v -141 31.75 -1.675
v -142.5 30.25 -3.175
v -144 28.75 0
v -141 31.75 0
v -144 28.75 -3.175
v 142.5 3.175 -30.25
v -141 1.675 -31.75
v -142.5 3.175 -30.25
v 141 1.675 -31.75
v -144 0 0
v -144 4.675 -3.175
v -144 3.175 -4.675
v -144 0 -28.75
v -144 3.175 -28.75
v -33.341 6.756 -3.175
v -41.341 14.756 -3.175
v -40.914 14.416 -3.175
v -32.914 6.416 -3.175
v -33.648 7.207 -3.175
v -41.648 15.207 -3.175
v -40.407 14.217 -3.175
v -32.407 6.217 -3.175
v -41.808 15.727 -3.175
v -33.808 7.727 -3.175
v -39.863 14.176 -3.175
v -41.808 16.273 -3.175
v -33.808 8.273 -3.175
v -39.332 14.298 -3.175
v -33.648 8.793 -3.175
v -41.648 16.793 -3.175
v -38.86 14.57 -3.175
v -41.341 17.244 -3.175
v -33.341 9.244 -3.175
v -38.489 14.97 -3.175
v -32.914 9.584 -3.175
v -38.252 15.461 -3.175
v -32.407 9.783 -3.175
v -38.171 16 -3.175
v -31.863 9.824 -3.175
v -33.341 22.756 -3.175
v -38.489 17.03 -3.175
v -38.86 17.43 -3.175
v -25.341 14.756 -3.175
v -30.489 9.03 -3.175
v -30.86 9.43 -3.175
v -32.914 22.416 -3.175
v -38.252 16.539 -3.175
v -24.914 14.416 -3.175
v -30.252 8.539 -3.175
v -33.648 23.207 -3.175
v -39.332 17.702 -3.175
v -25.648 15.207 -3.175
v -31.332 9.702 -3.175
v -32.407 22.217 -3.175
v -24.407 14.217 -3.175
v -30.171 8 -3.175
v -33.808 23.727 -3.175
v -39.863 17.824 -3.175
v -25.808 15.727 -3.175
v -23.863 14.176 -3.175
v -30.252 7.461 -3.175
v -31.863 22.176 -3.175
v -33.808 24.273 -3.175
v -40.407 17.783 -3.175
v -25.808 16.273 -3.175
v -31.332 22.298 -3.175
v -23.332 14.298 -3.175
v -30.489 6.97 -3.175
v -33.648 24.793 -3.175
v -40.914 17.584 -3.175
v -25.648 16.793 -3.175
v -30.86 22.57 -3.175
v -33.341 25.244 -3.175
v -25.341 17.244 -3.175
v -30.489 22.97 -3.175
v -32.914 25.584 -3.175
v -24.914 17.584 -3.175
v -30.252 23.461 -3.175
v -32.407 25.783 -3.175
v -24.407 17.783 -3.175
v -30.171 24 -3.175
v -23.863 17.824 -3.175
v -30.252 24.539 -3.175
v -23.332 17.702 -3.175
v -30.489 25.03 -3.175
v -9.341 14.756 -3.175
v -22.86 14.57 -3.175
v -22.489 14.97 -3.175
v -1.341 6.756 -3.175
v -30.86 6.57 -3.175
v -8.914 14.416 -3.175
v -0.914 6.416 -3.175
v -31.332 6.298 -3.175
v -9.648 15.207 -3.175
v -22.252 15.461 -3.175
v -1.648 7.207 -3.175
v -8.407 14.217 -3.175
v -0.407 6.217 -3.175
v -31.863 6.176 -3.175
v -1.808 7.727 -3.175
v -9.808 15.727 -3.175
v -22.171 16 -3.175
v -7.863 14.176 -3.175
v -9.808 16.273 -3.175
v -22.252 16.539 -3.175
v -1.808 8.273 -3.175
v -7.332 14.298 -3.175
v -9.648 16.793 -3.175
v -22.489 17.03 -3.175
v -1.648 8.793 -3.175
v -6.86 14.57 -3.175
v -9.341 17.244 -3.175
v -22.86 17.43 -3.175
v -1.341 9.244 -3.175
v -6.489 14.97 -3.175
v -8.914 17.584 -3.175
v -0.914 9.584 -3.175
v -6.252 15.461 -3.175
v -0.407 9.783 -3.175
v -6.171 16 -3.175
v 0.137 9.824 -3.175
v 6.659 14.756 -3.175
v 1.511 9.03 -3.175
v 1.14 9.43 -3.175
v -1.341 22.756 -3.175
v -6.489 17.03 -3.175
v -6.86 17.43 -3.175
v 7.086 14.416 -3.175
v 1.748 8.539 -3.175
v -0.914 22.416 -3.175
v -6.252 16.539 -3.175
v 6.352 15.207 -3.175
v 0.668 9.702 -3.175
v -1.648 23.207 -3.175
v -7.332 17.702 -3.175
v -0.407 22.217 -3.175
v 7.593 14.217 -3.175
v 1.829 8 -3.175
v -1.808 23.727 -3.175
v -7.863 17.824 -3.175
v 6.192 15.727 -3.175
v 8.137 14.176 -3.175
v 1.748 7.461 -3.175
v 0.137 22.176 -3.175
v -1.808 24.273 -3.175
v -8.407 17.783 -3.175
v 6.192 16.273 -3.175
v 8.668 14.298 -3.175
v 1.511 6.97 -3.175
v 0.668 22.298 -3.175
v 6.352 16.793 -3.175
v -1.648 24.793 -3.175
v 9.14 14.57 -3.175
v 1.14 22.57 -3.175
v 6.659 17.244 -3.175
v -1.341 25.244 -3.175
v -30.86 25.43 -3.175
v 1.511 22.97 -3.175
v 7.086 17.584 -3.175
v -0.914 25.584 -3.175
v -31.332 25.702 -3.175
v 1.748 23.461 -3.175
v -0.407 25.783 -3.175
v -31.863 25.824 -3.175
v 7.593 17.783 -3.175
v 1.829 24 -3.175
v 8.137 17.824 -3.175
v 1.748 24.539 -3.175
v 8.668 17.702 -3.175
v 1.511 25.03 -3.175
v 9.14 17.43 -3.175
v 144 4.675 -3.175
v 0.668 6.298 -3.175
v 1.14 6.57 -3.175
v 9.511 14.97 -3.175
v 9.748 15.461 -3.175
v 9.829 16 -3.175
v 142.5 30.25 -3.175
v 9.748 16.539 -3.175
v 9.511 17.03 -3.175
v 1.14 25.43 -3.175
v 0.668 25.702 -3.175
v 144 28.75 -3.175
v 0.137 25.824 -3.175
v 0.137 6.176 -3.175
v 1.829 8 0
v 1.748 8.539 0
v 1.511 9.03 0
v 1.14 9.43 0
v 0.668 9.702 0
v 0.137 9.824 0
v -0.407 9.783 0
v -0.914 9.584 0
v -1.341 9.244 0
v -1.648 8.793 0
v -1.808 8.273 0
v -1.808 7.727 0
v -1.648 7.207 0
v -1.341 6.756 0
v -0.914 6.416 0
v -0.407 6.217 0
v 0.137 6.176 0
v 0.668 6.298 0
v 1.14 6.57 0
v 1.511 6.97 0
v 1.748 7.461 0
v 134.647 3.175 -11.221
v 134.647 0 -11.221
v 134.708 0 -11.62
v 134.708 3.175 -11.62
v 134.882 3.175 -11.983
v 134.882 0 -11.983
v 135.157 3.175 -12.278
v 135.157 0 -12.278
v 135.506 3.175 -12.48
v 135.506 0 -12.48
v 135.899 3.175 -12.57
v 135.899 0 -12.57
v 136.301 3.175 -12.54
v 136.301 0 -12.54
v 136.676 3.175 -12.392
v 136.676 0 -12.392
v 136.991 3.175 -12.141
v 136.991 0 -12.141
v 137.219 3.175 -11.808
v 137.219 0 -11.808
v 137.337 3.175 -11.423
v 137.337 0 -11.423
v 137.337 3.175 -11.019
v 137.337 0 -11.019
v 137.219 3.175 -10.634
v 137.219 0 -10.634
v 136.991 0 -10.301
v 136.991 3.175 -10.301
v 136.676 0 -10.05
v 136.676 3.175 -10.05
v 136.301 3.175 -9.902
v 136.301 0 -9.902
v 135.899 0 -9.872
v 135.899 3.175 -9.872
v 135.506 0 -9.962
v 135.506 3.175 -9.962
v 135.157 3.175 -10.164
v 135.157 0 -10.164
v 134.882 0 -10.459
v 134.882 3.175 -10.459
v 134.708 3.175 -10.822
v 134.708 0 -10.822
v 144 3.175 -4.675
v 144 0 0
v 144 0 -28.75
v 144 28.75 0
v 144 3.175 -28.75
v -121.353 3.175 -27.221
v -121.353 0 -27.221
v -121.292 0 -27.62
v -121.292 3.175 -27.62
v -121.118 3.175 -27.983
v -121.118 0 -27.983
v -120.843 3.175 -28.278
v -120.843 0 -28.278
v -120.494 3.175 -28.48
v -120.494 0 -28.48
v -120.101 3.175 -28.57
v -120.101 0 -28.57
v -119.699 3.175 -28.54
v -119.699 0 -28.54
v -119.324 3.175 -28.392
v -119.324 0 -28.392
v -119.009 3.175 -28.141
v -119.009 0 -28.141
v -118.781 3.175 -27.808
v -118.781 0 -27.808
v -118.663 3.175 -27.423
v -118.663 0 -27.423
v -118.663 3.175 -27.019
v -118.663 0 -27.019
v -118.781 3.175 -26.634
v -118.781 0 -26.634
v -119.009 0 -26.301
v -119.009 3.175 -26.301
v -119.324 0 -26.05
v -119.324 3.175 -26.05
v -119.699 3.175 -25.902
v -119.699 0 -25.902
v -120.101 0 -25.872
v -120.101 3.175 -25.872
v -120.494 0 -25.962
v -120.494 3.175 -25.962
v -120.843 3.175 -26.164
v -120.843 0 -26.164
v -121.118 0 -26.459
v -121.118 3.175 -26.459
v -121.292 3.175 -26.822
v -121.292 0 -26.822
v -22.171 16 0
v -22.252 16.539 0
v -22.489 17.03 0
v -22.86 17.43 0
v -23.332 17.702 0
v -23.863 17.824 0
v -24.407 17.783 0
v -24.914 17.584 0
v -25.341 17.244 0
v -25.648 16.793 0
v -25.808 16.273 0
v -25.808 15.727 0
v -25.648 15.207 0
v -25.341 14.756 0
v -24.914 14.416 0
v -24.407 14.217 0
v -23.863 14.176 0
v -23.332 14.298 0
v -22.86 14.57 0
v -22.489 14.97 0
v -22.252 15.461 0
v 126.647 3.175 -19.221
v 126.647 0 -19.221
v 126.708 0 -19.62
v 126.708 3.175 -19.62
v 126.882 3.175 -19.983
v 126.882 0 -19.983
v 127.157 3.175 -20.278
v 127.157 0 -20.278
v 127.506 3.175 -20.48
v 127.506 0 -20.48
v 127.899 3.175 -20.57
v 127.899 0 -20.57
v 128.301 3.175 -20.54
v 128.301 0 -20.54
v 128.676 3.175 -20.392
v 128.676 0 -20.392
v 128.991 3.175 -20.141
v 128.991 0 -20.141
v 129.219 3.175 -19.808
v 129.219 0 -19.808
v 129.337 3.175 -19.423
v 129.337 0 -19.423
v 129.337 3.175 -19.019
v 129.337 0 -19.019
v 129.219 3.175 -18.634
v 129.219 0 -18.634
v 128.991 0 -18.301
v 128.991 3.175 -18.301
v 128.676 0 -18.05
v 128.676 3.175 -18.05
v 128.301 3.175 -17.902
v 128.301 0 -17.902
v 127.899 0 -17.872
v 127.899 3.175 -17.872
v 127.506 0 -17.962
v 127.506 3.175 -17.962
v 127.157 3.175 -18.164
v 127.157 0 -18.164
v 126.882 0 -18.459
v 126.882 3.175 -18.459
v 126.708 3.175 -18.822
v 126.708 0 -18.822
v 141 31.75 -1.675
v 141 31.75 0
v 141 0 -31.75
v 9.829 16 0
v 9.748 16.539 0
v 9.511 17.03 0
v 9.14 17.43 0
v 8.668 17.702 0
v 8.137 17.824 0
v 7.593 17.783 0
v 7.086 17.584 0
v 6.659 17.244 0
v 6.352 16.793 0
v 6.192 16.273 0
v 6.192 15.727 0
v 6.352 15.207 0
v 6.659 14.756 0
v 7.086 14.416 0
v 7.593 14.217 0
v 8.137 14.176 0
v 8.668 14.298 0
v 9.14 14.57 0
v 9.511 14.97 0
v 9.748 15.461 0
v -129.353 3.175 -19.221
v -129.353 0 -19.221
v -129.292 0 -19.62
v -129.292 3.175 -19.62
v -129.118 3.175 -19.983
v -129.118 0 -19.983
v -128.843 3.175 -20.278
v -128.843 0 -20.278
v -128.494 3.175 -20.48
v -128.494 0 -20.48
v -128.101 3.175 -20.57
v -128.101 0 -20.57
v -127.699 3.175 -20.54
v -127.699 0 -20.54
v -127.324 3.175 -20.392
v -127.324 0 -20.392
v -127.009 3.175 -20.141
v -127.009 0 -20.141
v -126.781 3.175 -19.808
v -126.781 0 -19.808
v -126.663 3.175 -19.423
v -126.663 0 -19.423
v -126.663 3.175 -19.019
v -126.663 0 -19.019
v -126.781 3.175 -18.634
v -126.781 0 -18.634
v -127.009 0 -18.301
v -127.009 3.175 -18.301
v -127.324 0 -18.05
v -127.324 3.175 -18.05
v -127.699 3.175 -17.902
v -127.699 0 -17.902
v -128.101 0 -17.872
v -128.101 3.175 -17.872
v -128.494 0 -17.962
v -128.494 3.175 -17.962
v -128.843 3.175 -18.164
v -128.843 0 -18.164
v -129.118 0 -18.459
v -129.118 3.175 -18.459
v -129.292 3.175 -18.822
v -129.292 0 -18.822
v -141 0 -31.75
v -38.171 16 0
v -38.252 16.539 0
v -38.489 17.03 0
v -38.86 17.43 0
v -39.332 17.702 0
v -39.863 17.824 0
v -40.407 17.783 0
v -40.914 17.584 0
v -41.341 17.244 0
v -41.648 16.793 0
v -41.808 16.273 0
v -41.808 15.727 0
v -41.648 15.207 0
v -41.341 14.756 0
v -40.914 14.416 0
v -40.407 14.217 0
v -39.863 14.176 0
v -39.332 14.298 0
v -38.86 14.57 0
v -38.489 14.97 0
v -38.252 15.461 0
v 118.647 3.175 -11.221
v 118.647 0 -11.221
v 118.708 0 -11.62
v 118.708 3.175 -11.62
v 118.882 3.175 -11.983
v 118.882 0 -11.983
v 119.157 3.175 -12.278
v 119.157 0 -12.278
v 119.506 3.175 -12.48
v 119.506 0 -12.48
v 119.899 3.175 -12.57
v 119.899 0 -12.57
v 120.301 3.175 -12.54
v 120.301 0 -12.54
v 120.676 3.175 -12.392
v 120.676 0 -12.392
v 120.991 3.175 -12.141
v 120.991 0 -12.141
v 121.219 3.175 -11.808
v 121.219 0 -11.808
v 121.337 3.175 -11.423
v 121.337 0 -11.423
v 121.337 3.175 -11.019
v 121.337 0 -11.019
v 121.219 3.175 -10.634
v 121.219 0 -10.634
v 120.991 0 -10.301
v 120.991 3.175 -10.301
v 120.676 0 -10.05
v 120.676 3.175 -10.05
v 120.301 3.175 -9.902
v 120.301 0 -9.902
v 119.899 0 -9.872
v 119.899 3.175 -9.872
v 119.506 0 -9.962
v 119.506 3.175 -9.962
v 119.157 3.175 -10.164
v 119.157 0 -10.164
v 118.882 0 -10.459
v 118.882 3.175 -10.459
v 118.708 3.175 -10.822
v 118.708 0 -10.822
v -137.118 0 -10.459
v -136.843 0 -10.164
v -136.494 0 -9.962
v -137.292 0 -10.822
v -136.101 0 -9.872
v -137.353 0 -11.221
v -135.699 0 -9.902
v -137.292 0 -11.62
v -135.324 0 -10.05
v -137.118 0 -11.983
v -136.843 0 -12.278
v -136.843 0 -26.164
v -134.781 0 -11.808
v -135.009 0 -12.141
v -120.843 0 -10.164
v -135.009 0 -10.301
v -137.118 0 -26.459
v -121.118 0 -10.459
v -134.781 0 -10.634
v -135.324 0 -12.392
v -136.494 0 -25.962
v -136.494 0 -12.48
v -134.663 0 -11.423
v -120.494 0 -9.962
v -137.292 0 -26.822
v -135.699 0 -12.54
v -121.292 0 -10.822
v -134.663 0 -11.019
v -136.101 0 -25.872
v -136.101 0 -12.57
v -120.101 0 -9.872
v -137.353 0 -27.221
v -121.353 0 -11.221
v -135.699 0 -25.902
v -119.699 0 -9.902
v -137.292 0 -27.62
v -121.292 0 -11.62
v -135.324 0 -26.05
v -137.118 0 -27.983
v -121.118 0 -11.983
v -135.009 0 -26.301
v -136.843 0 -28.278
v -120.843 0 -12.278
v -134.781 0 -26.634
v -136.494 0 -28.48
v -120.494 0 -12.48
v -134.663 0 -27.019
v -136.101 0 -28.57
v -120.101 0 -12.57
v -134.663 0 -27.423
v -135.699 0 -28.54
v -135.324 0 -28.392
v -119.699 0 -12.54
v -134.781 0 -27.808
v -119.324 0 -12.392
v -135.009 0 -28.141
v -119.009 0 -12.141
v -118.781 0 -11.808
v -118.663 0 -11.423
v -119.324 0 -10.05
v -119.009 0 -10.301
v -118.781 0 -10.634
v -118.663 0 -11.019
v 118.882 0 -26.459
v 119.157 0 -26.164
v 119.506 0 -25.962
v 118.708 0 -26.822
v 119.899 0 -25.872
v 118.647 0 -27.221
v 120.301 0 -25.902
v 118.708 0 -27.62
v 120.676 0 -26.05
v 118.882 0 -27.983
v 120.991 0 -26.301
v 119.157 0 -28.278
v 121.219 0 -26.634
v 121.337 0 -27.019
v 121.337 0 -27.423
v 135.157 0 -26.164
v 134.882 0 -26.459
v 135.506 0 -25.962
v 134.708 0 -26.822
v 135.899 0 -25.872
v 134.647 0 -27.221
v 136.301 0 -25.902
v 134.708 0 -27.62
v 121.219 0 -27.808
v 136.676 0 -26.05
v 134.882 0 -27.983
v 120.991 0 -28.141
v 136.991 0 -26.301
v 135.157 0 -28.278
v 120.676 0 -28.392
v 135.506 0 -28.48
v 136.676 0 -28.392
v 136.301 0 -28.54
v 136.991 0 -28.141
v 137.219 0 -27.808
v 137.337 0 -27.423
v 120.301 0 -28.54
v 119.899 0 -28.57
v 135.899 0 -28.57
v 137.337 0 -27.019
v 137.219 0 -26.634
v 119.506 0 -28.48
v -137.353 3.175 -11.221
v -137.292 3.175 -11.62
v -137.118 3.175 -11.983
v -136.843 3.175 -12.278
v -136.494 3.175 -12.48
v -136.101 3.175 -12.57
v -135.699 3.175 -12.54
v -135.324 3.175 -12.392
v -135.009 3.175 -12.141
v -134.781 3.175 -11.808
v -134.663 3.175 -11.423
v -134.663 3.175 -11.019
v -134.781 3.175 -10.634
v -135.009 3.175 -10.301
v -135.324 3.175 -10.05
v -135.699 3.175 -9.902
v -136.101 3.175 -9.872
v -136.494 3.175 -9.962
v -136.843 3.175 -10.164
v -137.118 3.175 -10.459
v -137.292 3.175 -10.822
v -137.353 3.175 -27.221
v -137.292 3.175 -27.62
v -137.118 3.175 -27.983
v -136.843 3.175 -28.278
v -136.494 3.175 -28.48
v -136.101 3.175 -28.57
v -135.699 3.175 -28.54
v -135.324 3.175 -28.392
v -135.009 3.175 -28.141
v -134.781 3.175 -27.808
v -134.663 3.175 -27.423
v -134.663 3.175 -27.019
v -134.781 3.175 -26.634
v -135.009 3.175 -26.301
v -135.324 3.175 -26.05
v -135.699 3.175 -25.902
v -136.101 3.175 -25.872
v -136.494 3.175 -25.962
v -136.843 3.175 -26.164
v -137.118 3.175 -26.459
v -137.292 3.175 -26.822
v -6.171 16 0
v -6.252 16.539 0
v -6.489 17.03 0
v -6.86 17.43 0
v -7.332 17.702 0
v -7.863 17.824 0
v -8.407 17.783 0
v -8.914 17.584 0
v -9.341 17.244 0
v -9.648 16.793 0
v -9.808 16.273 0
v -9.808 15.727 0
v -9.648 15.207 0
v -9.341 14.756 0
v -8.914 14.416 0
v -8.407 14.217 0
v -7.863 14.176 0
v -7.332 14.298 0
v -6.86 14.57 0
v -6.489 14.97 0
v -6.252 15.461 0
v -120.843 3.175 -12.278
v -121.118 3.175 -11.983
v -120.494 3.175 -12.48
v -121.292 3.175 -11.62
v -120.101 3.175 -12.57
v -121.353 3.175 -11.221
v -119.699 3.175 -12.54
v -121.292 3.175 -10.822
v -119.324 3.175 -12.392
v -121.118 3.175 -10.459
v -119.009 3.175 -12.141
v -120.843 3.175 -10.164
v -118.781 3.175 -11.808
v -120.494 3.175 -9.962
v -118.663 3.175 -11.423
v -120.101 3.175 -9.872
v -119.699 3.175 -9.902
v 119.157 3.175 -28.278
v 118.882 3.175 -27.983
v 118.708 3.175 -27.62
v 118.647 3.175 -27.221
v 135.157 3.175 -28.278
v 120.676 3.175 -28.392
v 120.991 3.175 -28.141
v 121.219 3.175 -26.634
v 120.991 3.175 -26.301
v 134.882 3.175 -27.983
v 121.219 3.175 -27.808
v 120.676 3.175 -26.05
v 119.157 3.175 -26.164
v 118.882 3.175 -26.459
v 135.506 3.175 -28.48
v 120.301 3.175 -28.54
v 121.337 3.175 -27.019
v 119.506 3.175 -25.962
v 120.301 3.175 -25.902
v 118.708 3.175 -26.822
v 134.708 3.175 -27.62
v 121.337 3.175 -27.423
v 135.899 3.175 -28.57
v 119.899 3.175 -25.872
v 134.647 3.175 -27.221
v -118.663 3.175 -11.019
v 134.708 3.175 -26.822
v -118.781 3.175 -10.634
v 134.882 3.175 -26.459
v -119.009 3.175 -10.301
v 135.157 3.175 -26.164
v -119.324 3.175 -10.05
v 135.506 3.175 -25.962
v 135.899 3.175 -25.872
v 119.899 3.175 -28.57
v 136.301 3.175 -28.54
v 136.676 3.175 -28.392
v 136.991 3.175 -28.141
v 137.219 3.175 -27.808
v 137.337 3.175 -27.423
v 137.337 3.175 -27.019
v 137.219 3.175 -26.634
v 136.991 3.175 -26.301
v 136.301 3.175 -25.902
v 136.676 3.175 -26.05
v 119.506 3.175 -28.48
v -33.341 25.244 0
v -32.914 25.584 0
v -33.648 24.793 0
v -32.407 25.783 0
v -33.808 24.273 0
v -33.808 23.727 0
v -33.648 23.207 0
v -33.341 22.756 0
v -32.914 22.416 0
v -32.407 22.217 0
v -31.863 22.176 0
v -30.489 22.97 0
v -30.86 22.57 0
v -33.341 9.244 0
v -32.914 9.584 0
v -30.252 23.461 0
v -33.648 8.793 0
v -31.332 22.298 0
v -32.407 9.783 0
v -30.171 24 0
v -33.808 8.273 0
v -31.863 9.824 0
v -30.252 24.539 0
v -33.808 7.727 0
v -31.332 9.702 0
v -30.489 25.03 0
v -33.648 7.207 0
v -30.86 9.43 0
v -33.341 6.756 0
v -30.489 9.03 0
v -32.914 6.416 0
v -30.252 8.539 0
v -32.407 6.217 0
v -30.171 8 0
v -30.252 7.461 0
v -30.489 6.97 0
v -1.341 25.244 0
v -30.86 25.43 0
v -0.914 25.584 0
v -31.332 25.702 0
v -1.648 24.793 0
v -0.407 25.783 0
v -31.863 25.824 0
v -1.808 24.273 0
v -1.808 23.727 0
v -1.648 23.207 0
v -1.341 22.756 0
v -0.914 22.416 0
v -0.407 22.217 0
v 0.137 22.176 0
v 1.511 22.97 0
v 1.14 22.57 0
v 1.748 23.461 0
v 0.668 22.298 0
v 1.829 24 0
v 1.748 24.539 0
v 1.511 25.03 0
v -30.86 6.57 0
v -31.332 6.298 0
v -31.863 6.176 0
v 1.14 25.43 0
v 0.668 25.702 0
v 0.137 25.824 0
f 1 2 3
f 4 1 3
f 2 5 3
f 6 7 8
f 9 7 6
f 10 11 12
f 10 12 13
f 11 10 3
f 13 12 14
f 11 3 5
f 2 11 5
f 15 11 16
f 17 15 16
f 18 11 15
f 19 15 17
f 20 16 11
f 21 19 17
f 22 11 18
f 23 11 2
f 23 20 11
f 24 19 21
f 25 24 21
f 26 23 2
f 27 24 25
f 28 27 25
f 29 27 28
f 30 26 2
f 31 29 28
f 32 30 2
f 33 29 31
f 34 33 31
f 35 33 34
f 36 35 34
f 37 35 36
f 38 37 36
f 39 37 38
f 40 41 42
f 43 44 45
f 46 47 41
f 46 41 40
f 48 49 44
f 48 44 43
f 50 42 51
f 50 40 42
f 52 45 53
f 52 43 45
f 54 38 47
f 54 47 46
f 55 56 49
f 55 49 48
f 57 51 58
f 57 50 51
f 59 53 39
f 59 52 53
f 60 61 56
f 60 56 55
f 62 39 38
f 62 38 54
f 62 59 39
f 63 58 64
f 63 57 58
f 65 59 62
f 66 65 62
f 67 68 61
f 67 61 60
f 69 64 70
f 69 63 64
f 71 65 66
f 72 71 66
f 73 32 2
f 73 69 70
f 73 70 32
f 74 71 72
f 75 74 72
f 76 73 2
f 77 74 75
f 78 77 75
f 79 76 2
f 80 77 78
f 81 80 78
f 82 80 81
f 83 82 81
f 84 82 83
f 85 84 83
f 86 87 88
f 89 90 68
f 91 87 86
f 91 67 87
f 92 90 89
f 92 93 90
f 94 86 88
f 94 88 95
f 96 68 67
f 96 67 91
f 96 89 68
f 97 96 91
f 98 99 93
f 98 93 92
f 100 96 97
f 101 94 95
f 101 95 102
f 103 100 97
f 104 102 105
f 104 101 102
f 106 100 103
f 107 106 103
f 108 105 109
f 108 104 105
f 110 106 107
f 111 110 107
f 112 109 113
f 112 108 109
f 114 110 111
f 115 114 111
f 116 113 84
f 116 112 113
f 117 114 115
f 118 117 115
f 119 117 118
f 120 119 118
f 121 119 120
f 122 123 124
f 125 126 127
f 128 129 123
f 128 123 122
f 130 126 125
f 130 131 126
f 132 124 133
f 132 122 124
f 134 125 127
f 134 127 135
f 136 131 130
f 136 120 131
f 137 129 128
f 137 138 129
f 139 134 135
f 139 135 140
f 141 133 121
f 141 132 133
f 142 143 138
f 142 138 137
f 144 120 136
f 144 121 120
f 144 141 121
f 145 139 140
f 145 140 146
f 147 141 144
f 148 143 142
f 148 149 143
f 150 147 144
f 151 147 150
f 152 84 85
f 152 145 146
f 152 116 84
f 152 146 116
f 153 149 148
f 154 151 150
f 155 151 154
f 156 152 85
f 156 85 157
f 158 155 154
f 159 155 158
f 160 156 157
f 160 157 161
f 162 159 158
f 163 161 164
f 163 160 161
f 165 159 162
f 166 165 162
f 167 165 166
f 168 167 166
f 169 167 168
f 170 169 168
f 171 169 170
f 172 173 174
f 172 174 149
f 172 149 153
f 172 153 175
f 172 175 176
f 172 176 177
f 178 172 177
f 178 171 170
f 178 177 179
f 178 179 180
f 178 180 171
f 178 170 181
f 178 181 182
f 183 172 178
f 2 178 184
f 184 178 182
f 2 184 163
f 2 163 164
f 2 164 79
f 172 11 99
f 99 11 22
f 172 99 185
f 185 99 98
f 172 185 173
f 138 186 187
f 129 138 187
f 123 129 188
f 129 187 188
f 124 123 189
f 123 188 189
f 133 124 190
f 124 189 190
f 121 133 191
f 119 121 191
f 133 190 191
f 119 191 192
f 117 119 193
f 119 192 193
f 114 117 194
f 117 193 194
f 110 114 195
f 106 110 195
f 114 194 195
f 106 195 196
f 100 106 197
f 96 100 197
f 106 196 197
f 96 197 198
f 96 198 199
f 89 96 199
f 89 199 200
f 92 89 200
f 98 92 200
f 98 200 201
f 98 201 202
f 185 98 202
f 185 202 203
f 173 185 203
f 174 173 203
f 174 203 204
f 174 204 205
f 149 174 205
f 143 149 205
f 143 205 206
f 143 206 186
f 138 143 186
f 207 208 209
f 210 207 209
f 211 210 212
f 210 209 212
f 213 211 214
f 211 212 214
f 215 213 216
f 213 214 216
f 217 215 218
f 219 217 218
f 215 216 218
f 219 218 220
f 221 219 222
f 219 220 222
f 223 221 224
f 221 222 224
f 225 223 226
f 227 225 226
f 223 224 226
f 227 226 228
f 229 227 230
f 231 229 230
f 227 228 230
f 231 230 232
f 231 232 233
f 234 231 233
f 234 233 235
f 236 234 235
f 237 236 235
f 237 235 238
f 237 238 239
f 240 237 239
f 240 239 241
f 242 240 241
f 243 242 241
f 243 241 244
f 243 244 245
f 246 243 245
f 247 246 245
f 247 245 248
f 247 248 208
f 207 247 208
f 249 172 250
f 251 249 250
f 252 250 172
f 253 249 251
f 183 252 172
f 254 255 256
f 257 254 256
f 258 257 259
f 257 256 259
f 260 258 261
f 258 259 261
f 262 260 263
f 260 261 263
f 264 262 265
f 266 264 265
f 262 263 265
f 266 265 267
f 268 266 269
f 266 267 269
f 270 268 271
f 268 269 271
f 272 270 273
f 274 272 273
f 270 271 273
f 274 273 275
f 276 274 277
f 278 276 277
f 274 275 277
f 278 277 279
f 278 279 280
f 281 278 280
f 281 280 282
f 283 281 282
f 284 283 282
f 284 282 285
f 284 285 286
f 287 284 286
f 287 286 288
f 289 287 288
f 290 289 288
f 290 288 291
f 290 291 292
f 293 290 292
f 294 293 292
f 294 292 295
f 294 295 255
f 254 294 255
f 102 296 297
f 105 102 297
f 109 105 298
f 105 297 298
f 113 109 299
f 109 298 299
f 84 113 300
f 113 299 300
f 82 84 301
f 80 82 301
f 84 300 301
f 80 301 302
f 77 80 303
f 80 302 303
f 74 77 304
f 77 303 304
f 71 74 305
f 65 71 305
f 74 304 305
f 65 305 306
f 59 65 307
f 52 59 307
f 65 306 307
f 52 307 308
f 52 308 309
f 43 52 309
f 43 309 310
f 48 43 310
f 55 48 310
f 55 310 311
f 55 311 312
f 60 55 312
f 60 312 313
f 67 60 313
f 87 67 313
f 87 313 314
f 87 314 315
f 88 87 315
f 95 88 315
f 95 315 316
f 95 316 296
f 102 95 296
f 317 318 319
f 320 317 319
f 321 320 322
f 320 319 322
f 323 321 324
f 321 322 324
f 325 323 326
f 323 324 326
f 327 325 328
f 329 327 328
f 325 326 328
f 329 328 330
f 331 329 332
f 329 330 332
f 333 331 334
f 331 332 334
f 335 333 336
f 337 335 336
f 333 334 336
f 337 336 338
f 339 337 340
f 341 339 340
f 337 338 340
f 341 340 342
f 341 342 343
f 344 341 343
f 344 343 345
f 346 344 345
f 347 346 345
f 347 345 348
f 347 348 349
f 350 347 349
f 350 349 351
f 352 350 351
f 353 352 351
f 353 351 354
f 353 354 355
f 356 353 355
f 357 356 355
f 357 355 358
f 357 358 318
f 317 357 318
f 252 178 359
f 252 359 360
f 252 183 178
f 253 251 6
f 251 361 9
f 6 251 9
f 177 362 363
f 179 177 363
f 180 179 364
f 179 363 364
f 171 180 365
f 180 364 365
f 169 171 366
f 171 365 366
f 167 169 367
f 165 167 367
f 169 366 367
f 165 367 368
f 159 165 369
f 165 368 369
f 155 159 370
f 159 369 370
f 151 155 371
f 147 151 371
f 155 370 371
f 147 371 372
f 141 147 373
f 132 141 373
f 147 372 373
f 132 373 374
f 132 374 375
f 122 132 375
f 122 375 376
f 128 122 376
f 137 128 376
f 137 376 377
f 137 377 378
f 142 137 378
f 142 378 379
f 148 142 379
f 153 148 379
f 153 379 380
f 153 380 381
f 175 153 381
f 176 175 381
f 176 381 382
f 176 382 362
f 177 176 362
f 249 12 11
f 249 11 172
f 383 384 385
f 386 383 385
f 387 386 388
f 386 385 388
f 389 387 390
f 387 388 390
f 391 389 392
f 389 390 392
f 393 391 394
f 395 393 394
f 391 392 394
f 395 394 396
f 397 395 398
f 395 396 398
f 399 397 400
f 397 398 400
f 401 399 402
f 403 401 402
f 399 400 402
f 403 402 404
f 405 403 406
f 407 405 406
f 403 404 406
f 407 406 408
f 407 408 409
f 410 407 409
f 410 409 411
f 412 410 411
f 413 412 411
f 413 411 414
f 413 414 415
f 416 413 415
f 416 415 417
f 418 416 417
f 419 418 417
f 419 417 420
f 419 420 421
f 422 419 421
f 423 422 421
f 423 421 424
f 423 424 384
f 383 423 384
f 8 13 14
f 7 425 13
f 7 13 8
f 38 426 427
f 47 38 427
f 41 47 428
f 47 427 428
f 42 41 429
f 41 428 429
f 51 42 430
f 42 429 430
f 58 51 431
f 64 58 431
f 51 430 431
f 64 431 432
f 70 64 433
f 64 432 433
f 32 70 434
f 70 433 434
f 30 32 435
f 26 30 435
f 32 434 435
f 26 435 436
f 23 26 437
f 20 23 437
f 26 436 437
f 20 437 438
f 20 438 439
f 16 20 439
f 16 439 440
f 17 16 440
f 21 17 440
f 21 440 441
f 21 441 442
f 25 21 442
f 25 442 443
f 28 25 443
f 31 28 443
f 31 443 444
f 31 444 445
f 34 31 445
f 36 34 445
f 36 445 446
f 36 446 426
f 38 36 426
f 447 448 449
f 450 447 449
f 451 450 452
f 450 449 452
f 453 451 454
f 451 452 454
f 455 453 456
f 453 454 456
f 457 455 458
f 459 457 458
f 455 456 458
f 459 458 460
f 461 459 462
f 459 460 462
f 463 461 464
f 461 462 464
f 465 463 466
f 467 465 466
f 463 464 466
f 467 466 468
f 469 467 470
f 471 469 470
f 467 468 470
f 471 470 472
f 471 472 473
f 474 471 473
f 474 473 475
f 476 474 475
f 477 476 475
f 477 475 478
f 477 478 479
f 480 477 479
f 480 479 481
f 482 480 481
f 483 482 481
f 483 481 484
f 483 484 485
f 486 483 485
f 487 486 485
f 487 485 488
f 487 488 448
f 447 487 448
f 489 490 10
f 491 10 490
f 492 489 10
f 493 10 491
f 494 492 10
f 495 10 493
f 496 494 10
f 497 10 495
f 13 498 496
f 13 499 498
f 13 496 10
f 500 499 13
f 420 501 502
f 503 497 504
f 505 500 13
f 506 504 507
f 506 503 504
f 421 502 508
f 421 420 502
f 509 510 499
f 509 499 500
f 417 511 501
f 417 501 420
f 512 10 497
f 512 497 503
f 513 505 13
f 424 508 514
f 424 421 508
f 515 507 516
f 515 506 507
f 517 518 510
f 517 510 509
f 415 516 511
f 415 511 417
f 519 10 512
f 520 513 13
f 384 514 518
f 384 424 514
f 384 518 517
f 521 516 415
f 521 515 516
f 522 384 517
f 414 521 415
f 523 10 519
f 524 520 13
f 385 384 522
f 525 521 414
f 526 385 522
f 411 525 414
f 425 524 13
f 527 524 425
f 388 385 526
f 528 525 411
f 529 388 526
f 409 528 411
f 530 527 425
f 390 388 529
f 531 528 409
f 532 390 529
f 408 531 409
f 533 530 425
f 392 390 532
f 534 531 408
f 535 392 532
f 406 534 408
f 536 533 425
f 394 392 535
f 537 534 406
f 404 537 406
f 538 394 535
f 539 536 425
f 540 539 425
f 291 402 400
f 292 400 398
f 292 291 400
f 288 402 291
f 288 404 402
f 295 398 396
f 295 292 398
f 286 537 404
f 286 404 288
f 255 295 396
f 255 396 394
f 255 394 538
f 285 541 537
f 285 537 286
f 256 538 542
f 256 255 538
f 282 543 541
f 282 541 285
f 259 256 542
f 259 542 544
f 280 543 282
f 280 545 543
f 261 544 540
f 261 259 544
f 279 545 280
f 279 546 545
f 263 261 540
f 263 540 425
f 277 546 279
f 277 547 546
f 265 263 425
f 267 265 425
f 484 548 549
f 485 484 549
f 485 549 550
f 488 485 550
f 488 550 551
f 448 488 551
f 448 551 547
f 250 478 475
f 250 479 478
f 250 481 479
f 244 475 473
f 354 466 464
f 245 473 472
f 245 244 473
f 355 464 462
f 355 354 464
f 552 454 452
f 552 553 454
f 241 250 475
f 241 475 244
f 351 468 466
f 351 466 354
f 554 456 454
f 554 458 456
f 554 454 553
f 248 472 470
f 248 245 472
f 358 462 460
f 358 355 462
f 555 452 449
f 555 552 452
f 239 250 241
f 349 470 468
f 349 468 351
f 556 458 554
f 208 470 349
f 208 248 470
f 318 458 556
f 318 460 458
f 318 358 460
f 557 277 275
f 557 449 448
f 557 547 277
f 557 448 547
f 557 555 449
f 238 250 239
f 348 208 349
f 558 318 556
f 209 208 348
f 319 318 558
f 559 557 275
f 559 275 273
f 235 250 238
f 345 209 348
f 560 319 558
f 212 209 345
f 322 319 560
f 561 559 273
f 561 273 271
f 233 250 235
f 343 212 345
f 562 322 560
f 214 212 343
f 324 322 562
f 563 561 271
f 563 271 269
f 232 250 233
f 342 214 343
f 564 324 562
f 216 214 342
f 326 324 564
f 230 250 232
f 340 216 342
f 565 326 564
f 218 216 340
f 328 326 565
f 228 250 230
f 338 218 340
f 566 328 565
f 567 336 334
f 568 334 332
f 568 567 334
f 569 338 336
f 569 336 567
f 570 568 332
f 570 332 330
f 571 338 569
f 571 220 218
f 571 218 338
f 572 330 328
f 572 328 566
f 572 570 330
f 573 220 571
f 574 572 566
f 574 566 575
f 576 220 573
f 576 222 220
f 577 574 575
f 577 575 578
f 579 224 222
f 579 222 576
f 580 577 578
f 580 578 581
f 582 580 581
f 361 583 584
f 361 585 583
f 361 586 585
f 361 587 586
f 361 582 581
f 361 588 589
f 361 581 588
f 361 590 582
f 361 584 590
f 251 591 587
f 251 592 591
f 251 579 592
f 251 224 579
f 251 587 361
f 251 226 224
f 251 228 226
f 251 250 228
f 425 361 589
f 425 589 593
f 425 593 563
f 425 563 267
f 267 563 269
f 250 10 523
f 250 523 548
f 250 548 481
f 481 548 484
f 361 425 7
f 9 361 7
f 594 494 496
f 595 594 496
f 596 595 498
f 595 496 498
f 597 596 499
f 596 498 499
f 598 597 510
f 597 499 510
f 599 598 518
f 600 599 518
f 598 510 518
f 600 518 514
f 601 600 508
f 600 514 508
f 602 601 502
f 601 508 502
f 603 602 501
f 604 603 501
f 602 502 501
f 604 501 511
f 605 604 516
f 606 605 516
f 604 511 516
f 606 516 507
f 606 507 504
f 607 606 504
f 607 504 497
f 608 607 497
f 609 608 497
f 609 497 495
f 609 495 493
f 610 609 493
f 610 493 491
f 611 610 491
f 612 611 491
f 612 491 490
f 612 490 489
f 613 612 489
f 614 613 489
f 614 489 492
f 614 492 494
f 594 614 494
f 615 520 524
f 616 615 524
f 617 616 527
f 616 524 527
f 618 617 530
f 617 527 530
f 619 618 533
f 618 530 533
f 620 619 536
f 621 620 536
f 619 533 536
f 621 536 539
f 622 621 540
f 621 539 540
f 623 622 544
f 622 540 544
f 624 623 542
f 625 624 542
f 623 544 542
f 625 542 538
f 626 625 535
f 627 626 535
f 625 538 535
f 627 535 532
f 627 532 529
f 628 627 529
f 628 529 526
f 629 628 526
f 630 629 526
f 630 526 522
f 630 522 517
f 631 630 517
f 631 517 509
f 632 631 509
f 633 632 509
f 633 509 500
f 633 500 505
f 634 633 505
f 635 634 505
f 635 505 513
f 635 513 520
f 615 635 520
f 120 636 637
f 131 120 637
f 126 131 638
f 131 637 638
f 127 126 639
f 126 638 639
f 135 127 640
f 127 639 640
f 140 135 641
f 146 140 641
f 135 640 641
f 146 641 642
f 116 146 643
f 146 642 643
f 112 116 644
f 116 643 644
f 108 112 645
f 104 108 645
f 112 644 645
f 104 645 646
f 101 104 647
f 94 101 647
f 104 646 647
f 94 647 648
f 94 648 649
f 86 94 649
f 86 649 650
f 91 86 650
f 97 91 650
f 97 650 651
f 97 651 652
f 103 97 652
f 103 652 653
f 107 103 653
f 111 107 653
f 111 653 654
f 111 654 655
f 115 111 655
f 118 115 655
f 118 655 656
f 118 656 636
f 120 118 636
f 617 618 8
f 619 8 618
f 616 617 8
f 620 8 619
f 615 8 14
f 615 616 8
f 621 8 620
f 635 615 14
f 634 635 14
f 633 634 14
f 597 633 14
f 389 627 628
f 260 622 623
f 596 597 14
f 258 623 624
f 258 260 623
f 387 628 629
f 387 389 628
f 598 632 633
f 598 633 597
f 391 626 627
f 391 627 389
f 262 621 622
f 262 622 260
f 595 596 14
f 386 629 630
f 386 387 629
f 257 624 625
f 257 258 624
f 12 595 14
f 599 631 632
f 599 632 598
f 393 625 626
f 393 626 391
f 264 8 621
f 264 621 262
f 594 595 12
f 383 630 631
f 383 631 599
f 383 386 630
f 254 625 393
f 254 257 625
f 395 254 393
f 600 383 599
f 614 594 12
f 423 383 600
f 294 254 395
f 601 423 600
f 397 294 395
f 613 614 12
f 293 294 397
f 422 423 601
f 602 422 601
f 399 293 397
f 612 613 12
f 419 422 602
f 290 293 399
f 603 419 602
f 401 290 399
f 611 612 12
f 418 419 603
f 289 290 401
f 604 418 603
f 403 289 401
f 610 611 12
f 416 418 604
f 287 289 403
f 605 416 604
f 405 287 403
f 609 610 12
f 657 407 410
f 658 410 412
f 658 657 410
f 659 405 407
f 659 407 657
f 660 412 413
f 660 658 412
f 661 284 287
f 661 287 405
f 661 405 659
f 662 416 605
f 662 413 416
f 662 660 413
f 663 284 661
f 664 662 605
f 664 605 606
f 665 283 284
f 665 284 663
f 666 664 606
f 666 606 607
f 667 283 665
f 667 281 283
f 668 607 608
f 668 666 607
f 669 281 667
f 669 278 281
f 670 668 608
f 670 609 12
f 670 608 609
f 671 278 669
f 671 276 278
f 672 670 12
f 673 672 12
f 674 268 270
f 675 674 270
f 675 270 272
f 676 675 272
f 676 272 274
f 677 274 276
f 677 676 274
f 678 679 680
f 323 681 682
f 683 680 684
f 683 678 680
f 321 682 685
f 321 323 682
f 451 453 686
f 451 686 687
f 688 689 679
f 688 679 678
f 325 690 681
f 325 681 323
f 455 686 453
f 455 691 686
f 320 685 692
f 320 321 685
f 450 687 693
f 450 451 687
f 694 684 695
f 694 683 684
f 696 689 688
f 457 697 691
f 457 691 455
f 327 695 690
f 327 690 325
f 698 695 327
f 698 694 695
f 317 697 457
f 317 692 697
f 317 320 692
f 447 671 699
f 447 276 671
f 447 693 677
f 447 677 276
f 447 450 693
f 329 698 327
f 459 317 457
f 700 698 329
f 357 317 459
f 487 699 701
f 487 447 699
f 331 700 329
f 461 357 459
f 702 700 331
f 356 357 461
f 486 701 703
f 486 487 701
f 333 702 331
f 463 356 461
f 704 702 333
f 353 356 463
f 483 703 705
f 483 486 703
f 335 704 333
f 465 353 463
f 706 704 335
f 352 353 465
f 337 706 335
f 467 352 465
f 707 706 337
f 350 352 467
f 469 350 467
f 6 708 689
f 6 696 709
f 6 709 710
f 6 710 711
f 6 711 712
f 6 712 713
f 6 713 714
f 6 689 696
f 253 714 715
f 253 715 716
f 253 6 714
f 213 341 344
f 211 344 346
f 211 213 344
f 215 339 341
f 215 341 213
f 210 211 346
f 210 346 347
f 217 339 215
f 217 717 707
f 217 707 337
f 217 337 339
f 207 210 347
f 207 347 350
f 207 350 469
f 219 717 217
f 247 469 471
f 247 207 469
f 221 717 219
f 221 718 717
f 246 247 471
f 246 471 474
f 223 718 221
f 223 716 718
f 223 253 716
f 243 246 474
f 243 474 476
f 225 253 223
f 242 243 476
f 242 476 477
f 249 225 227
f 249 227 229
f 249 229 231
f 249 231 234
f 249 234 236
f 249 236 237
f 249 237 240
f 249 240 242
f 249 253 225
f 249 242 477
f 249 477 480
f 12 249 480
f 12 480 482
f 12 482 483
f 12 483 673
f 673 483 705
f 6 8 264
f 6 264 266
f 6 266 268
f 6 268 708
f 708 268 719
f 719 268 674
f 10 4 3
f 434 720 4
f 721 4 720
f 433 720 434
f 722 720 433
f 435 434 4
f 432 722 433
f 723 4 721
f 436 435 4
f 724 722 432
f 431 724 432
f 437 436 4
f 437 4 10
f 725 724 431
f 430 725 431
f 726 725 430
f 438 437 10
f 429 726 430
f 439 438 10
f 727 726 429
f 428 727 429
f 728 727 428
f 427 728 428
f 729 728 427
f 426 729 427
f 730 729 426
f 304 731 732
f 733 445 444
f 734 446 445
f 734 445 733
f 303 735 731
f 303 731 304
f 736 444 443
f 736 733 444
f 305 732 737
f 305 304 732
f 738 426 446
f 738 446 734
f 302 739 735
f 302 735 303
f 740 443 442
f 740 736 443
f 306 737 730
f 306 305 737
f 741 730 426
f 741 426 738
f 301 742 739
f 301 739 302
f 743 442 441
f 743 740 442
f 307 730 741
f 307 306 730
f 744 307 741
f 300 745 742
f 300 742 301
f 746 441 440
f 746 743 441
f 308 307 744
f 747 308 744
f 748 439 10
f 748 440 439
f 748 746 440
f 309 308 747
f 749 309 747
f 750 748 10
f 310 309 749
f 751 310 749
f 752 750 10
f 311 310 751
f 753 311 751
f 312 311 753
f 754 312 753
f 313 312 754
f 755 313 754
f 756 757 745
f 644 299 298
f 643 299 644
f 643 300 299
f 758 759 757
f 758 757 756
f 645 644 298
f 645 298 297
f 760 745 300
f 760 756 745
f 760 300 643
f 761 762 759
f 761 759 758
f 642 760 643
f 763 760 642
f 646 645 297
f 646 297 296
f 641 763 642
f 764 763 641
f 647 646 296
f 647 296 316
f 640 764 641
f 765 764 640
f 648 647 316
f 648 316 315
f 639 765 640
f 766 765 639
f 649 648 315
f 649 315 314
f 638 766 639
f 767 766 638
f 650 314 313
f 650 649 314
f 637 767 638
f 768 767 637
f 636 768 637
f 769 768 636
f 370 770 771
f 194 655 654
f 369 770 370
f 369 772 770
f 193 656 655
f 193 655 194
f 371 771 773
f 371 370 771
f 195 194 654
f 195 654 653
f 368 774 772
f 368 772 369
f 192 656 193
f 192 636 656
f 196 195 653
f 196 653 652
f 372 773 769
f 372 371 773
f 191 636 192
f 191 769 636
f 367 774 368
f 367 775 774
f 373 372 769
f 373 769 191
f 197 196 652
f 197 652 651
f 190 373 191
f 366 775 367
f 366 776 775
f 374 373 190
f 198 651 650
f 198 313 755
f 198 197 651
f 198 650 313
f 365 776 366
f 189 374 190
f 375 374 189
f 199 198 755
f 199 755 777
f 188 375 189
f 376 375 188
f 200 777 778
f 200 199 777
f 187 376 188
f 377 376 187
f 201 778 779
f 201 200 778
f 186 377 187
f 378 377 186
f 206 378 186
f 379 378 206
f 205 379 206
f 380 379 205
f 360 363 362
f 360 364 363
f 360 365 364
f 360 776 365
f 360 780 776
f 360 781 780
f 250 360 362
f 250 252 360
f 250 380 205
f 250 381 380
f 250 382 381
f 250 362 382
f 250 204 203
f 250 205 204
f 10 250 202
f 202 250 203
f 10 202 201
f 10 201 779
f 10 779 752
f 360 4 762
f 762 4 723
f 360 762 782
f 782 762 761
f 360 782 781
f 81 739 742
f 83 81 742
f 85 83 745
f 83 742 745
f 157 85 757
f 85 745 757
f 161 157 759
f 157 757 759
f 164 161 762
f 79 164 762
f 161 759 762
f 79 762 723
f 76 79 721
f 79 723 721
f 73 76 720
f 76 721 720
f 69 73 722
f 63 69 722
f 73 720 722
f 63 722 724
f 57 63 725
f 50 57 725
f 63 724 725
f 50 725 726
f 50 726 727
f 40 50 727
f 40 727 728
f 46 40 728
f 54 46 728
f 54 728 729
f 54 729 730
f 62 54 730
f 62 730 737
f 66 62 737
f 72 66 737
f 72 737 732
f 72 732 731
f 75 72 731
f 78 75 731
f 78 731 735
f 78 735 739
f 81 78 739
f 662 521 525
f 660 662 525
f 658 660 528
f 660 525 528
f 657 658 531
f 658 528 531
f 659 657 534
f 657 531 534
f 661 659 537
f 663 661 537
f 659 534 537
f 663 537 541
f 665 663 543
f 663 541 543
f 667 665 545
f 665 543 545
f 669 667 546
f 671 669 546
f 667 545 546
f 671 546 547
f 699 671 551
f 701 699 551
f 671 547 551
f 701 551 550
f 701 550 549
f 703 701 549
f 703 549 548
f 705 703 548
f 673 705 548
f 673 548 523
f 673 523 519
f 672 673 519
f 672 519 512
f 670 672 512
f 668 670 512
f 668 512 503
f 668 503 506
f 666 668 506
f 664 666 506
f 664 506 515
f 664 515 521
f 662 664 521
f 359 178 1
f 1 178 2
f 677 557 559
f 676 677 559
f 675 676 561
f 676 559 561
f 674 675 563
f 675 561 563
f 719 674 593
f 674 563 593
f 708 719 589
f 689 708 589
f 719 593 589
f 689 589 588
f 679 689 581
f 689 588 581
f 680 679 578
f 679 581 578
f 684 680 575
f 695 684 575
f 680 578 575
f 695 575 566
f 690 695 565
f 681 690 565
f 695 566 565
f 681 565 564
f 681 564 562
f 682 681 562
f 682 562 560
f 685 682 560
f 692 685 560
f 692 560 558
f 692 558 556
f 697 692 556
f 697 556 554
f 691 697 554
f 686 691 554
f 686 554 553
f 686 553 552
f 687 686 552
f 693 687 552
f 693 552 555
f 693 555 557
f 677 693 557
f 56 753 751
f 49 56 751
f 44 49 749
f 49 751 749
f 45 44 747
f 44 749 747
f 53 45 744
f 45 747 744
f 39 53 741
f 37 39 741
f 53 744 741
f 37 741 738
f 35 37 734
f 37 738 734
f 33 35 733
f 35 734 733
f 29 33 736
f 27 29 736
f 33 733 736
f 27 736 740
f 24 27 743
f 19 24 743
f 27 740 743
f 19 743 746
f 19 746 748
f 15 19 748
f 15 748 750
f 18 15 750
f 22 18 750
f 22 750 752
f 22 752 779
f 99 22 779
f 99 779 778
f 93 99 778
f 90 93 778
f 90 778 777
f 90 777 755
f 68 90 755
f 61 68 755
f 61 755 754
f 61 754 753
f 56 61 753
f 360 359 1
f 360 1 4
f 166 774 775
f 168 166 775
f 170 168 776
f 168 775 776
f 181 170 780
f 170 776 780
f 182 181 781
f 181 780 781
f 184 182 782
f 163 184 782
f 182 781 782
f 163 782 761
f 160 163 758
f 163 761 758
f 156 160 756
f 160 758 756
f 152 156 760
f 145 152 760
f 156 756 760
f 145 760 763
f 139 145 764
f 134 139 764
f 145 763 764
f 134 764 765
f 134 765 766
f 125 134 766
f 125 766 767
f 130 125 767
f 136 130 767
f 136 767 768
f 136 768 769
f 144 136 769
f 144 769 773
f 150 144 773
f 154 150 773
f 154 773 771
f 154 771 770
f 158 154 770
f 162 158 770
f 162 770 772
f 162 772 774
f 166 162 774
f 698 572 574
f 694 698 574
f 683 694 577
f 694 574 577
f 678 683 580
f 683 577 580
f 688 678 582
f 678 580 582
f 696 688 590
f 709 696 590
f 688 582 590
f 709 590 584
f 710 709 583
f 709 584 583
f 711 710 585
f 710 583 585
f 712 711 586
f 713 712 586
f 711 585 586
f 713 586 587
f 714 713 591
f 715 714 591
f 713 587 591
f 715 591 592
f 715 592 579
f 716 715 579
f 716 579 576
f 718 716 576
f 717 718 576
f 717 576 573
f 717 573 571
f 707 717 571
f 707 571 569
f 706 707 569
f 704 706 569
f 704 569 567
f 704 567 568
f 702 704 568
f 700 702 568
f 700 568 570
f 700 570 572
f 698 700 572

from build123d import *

# Parameters (mm, degrees)
BOSS_EXTRUDE1_DEPTH   = 144
CHAMFER1_SIZE         = 1.5
CHAMFER2_SIZE         = 3
F_6_32_TAPPED_HOLE1_D = 2.7051
F_6_CLEARANCE_HOLE1_D = 3.6576


with BuildPart() as part:
    # Sketch1 → Boss-Extrude1 (new body, symmetric)
    with BuildSketch(Plane(origin=(0, 0, 0), x_dir=(0, 0, -1), z_dir=(1, 0, 0))):
        Polygon((0, 0), (31.75, 0), (31.75, 3.175), (3.175, 3.175), (3.175, 31.75), (0, 31.75), align=None)
    extrude(amount=BOSS_EXTRUDE1_DEPTH, both=True)

    # Chamfer1
    chamfer1_edges = [part.edges().sort_by_distance(p)[0] for p in [
        (0, 31.75, -3.175),
        (0, 3.175, -3.175),
        (0, 3.175, -31.75),
    ]]
    chamfer(chamfer1_edges, length=CHAMFER1_SIZE)

    # Chamfer2
    chamfer2_edges = [part.edges().sort_by_distance(p)[0] for p in [
        (-144, 31.75, -0.8375),
        (-144, 0.8375, -31.75),
        (144, 0.8375, -31.75),
        (144, 31.75, -0.8375),
    ]]
    chamfer(chamfer2_edges, length=CHAMFER2_SIZE)

    # #6-32 Tapped Hole1 (through all)
    with Locations(Plane(origin=(0, 3.175, 0), x_dir=(1, 0, 0), z_dir=(0, 1, 0))):
        with Locations((-136, 27.221), (-120, 27.221), (-128, 19.221), (-136, 11.221), (-120, 11.221), (120, 27.221), (136, 27.221), (128, 19.221), (120, 11.221), (136, 11.221)):
            Hole(F_6_32_TAPPED_HOLE1_D / 2)

    # #6 Clearance Hole1 (through all)
    with Locations(Plane(origin=(0, 0, -3.175), x_dir=(-1, 0, 0), z_dir=(0, 0, -1))):
        with Locations((0, 24), (-8, 16), (8, 16), (0, 8), (24, 16), (32, 24), (40, 16), (32, 8)):
            Hole(F_6_CLEARANCE_HOLE1_D / 2)


solid = part.part
